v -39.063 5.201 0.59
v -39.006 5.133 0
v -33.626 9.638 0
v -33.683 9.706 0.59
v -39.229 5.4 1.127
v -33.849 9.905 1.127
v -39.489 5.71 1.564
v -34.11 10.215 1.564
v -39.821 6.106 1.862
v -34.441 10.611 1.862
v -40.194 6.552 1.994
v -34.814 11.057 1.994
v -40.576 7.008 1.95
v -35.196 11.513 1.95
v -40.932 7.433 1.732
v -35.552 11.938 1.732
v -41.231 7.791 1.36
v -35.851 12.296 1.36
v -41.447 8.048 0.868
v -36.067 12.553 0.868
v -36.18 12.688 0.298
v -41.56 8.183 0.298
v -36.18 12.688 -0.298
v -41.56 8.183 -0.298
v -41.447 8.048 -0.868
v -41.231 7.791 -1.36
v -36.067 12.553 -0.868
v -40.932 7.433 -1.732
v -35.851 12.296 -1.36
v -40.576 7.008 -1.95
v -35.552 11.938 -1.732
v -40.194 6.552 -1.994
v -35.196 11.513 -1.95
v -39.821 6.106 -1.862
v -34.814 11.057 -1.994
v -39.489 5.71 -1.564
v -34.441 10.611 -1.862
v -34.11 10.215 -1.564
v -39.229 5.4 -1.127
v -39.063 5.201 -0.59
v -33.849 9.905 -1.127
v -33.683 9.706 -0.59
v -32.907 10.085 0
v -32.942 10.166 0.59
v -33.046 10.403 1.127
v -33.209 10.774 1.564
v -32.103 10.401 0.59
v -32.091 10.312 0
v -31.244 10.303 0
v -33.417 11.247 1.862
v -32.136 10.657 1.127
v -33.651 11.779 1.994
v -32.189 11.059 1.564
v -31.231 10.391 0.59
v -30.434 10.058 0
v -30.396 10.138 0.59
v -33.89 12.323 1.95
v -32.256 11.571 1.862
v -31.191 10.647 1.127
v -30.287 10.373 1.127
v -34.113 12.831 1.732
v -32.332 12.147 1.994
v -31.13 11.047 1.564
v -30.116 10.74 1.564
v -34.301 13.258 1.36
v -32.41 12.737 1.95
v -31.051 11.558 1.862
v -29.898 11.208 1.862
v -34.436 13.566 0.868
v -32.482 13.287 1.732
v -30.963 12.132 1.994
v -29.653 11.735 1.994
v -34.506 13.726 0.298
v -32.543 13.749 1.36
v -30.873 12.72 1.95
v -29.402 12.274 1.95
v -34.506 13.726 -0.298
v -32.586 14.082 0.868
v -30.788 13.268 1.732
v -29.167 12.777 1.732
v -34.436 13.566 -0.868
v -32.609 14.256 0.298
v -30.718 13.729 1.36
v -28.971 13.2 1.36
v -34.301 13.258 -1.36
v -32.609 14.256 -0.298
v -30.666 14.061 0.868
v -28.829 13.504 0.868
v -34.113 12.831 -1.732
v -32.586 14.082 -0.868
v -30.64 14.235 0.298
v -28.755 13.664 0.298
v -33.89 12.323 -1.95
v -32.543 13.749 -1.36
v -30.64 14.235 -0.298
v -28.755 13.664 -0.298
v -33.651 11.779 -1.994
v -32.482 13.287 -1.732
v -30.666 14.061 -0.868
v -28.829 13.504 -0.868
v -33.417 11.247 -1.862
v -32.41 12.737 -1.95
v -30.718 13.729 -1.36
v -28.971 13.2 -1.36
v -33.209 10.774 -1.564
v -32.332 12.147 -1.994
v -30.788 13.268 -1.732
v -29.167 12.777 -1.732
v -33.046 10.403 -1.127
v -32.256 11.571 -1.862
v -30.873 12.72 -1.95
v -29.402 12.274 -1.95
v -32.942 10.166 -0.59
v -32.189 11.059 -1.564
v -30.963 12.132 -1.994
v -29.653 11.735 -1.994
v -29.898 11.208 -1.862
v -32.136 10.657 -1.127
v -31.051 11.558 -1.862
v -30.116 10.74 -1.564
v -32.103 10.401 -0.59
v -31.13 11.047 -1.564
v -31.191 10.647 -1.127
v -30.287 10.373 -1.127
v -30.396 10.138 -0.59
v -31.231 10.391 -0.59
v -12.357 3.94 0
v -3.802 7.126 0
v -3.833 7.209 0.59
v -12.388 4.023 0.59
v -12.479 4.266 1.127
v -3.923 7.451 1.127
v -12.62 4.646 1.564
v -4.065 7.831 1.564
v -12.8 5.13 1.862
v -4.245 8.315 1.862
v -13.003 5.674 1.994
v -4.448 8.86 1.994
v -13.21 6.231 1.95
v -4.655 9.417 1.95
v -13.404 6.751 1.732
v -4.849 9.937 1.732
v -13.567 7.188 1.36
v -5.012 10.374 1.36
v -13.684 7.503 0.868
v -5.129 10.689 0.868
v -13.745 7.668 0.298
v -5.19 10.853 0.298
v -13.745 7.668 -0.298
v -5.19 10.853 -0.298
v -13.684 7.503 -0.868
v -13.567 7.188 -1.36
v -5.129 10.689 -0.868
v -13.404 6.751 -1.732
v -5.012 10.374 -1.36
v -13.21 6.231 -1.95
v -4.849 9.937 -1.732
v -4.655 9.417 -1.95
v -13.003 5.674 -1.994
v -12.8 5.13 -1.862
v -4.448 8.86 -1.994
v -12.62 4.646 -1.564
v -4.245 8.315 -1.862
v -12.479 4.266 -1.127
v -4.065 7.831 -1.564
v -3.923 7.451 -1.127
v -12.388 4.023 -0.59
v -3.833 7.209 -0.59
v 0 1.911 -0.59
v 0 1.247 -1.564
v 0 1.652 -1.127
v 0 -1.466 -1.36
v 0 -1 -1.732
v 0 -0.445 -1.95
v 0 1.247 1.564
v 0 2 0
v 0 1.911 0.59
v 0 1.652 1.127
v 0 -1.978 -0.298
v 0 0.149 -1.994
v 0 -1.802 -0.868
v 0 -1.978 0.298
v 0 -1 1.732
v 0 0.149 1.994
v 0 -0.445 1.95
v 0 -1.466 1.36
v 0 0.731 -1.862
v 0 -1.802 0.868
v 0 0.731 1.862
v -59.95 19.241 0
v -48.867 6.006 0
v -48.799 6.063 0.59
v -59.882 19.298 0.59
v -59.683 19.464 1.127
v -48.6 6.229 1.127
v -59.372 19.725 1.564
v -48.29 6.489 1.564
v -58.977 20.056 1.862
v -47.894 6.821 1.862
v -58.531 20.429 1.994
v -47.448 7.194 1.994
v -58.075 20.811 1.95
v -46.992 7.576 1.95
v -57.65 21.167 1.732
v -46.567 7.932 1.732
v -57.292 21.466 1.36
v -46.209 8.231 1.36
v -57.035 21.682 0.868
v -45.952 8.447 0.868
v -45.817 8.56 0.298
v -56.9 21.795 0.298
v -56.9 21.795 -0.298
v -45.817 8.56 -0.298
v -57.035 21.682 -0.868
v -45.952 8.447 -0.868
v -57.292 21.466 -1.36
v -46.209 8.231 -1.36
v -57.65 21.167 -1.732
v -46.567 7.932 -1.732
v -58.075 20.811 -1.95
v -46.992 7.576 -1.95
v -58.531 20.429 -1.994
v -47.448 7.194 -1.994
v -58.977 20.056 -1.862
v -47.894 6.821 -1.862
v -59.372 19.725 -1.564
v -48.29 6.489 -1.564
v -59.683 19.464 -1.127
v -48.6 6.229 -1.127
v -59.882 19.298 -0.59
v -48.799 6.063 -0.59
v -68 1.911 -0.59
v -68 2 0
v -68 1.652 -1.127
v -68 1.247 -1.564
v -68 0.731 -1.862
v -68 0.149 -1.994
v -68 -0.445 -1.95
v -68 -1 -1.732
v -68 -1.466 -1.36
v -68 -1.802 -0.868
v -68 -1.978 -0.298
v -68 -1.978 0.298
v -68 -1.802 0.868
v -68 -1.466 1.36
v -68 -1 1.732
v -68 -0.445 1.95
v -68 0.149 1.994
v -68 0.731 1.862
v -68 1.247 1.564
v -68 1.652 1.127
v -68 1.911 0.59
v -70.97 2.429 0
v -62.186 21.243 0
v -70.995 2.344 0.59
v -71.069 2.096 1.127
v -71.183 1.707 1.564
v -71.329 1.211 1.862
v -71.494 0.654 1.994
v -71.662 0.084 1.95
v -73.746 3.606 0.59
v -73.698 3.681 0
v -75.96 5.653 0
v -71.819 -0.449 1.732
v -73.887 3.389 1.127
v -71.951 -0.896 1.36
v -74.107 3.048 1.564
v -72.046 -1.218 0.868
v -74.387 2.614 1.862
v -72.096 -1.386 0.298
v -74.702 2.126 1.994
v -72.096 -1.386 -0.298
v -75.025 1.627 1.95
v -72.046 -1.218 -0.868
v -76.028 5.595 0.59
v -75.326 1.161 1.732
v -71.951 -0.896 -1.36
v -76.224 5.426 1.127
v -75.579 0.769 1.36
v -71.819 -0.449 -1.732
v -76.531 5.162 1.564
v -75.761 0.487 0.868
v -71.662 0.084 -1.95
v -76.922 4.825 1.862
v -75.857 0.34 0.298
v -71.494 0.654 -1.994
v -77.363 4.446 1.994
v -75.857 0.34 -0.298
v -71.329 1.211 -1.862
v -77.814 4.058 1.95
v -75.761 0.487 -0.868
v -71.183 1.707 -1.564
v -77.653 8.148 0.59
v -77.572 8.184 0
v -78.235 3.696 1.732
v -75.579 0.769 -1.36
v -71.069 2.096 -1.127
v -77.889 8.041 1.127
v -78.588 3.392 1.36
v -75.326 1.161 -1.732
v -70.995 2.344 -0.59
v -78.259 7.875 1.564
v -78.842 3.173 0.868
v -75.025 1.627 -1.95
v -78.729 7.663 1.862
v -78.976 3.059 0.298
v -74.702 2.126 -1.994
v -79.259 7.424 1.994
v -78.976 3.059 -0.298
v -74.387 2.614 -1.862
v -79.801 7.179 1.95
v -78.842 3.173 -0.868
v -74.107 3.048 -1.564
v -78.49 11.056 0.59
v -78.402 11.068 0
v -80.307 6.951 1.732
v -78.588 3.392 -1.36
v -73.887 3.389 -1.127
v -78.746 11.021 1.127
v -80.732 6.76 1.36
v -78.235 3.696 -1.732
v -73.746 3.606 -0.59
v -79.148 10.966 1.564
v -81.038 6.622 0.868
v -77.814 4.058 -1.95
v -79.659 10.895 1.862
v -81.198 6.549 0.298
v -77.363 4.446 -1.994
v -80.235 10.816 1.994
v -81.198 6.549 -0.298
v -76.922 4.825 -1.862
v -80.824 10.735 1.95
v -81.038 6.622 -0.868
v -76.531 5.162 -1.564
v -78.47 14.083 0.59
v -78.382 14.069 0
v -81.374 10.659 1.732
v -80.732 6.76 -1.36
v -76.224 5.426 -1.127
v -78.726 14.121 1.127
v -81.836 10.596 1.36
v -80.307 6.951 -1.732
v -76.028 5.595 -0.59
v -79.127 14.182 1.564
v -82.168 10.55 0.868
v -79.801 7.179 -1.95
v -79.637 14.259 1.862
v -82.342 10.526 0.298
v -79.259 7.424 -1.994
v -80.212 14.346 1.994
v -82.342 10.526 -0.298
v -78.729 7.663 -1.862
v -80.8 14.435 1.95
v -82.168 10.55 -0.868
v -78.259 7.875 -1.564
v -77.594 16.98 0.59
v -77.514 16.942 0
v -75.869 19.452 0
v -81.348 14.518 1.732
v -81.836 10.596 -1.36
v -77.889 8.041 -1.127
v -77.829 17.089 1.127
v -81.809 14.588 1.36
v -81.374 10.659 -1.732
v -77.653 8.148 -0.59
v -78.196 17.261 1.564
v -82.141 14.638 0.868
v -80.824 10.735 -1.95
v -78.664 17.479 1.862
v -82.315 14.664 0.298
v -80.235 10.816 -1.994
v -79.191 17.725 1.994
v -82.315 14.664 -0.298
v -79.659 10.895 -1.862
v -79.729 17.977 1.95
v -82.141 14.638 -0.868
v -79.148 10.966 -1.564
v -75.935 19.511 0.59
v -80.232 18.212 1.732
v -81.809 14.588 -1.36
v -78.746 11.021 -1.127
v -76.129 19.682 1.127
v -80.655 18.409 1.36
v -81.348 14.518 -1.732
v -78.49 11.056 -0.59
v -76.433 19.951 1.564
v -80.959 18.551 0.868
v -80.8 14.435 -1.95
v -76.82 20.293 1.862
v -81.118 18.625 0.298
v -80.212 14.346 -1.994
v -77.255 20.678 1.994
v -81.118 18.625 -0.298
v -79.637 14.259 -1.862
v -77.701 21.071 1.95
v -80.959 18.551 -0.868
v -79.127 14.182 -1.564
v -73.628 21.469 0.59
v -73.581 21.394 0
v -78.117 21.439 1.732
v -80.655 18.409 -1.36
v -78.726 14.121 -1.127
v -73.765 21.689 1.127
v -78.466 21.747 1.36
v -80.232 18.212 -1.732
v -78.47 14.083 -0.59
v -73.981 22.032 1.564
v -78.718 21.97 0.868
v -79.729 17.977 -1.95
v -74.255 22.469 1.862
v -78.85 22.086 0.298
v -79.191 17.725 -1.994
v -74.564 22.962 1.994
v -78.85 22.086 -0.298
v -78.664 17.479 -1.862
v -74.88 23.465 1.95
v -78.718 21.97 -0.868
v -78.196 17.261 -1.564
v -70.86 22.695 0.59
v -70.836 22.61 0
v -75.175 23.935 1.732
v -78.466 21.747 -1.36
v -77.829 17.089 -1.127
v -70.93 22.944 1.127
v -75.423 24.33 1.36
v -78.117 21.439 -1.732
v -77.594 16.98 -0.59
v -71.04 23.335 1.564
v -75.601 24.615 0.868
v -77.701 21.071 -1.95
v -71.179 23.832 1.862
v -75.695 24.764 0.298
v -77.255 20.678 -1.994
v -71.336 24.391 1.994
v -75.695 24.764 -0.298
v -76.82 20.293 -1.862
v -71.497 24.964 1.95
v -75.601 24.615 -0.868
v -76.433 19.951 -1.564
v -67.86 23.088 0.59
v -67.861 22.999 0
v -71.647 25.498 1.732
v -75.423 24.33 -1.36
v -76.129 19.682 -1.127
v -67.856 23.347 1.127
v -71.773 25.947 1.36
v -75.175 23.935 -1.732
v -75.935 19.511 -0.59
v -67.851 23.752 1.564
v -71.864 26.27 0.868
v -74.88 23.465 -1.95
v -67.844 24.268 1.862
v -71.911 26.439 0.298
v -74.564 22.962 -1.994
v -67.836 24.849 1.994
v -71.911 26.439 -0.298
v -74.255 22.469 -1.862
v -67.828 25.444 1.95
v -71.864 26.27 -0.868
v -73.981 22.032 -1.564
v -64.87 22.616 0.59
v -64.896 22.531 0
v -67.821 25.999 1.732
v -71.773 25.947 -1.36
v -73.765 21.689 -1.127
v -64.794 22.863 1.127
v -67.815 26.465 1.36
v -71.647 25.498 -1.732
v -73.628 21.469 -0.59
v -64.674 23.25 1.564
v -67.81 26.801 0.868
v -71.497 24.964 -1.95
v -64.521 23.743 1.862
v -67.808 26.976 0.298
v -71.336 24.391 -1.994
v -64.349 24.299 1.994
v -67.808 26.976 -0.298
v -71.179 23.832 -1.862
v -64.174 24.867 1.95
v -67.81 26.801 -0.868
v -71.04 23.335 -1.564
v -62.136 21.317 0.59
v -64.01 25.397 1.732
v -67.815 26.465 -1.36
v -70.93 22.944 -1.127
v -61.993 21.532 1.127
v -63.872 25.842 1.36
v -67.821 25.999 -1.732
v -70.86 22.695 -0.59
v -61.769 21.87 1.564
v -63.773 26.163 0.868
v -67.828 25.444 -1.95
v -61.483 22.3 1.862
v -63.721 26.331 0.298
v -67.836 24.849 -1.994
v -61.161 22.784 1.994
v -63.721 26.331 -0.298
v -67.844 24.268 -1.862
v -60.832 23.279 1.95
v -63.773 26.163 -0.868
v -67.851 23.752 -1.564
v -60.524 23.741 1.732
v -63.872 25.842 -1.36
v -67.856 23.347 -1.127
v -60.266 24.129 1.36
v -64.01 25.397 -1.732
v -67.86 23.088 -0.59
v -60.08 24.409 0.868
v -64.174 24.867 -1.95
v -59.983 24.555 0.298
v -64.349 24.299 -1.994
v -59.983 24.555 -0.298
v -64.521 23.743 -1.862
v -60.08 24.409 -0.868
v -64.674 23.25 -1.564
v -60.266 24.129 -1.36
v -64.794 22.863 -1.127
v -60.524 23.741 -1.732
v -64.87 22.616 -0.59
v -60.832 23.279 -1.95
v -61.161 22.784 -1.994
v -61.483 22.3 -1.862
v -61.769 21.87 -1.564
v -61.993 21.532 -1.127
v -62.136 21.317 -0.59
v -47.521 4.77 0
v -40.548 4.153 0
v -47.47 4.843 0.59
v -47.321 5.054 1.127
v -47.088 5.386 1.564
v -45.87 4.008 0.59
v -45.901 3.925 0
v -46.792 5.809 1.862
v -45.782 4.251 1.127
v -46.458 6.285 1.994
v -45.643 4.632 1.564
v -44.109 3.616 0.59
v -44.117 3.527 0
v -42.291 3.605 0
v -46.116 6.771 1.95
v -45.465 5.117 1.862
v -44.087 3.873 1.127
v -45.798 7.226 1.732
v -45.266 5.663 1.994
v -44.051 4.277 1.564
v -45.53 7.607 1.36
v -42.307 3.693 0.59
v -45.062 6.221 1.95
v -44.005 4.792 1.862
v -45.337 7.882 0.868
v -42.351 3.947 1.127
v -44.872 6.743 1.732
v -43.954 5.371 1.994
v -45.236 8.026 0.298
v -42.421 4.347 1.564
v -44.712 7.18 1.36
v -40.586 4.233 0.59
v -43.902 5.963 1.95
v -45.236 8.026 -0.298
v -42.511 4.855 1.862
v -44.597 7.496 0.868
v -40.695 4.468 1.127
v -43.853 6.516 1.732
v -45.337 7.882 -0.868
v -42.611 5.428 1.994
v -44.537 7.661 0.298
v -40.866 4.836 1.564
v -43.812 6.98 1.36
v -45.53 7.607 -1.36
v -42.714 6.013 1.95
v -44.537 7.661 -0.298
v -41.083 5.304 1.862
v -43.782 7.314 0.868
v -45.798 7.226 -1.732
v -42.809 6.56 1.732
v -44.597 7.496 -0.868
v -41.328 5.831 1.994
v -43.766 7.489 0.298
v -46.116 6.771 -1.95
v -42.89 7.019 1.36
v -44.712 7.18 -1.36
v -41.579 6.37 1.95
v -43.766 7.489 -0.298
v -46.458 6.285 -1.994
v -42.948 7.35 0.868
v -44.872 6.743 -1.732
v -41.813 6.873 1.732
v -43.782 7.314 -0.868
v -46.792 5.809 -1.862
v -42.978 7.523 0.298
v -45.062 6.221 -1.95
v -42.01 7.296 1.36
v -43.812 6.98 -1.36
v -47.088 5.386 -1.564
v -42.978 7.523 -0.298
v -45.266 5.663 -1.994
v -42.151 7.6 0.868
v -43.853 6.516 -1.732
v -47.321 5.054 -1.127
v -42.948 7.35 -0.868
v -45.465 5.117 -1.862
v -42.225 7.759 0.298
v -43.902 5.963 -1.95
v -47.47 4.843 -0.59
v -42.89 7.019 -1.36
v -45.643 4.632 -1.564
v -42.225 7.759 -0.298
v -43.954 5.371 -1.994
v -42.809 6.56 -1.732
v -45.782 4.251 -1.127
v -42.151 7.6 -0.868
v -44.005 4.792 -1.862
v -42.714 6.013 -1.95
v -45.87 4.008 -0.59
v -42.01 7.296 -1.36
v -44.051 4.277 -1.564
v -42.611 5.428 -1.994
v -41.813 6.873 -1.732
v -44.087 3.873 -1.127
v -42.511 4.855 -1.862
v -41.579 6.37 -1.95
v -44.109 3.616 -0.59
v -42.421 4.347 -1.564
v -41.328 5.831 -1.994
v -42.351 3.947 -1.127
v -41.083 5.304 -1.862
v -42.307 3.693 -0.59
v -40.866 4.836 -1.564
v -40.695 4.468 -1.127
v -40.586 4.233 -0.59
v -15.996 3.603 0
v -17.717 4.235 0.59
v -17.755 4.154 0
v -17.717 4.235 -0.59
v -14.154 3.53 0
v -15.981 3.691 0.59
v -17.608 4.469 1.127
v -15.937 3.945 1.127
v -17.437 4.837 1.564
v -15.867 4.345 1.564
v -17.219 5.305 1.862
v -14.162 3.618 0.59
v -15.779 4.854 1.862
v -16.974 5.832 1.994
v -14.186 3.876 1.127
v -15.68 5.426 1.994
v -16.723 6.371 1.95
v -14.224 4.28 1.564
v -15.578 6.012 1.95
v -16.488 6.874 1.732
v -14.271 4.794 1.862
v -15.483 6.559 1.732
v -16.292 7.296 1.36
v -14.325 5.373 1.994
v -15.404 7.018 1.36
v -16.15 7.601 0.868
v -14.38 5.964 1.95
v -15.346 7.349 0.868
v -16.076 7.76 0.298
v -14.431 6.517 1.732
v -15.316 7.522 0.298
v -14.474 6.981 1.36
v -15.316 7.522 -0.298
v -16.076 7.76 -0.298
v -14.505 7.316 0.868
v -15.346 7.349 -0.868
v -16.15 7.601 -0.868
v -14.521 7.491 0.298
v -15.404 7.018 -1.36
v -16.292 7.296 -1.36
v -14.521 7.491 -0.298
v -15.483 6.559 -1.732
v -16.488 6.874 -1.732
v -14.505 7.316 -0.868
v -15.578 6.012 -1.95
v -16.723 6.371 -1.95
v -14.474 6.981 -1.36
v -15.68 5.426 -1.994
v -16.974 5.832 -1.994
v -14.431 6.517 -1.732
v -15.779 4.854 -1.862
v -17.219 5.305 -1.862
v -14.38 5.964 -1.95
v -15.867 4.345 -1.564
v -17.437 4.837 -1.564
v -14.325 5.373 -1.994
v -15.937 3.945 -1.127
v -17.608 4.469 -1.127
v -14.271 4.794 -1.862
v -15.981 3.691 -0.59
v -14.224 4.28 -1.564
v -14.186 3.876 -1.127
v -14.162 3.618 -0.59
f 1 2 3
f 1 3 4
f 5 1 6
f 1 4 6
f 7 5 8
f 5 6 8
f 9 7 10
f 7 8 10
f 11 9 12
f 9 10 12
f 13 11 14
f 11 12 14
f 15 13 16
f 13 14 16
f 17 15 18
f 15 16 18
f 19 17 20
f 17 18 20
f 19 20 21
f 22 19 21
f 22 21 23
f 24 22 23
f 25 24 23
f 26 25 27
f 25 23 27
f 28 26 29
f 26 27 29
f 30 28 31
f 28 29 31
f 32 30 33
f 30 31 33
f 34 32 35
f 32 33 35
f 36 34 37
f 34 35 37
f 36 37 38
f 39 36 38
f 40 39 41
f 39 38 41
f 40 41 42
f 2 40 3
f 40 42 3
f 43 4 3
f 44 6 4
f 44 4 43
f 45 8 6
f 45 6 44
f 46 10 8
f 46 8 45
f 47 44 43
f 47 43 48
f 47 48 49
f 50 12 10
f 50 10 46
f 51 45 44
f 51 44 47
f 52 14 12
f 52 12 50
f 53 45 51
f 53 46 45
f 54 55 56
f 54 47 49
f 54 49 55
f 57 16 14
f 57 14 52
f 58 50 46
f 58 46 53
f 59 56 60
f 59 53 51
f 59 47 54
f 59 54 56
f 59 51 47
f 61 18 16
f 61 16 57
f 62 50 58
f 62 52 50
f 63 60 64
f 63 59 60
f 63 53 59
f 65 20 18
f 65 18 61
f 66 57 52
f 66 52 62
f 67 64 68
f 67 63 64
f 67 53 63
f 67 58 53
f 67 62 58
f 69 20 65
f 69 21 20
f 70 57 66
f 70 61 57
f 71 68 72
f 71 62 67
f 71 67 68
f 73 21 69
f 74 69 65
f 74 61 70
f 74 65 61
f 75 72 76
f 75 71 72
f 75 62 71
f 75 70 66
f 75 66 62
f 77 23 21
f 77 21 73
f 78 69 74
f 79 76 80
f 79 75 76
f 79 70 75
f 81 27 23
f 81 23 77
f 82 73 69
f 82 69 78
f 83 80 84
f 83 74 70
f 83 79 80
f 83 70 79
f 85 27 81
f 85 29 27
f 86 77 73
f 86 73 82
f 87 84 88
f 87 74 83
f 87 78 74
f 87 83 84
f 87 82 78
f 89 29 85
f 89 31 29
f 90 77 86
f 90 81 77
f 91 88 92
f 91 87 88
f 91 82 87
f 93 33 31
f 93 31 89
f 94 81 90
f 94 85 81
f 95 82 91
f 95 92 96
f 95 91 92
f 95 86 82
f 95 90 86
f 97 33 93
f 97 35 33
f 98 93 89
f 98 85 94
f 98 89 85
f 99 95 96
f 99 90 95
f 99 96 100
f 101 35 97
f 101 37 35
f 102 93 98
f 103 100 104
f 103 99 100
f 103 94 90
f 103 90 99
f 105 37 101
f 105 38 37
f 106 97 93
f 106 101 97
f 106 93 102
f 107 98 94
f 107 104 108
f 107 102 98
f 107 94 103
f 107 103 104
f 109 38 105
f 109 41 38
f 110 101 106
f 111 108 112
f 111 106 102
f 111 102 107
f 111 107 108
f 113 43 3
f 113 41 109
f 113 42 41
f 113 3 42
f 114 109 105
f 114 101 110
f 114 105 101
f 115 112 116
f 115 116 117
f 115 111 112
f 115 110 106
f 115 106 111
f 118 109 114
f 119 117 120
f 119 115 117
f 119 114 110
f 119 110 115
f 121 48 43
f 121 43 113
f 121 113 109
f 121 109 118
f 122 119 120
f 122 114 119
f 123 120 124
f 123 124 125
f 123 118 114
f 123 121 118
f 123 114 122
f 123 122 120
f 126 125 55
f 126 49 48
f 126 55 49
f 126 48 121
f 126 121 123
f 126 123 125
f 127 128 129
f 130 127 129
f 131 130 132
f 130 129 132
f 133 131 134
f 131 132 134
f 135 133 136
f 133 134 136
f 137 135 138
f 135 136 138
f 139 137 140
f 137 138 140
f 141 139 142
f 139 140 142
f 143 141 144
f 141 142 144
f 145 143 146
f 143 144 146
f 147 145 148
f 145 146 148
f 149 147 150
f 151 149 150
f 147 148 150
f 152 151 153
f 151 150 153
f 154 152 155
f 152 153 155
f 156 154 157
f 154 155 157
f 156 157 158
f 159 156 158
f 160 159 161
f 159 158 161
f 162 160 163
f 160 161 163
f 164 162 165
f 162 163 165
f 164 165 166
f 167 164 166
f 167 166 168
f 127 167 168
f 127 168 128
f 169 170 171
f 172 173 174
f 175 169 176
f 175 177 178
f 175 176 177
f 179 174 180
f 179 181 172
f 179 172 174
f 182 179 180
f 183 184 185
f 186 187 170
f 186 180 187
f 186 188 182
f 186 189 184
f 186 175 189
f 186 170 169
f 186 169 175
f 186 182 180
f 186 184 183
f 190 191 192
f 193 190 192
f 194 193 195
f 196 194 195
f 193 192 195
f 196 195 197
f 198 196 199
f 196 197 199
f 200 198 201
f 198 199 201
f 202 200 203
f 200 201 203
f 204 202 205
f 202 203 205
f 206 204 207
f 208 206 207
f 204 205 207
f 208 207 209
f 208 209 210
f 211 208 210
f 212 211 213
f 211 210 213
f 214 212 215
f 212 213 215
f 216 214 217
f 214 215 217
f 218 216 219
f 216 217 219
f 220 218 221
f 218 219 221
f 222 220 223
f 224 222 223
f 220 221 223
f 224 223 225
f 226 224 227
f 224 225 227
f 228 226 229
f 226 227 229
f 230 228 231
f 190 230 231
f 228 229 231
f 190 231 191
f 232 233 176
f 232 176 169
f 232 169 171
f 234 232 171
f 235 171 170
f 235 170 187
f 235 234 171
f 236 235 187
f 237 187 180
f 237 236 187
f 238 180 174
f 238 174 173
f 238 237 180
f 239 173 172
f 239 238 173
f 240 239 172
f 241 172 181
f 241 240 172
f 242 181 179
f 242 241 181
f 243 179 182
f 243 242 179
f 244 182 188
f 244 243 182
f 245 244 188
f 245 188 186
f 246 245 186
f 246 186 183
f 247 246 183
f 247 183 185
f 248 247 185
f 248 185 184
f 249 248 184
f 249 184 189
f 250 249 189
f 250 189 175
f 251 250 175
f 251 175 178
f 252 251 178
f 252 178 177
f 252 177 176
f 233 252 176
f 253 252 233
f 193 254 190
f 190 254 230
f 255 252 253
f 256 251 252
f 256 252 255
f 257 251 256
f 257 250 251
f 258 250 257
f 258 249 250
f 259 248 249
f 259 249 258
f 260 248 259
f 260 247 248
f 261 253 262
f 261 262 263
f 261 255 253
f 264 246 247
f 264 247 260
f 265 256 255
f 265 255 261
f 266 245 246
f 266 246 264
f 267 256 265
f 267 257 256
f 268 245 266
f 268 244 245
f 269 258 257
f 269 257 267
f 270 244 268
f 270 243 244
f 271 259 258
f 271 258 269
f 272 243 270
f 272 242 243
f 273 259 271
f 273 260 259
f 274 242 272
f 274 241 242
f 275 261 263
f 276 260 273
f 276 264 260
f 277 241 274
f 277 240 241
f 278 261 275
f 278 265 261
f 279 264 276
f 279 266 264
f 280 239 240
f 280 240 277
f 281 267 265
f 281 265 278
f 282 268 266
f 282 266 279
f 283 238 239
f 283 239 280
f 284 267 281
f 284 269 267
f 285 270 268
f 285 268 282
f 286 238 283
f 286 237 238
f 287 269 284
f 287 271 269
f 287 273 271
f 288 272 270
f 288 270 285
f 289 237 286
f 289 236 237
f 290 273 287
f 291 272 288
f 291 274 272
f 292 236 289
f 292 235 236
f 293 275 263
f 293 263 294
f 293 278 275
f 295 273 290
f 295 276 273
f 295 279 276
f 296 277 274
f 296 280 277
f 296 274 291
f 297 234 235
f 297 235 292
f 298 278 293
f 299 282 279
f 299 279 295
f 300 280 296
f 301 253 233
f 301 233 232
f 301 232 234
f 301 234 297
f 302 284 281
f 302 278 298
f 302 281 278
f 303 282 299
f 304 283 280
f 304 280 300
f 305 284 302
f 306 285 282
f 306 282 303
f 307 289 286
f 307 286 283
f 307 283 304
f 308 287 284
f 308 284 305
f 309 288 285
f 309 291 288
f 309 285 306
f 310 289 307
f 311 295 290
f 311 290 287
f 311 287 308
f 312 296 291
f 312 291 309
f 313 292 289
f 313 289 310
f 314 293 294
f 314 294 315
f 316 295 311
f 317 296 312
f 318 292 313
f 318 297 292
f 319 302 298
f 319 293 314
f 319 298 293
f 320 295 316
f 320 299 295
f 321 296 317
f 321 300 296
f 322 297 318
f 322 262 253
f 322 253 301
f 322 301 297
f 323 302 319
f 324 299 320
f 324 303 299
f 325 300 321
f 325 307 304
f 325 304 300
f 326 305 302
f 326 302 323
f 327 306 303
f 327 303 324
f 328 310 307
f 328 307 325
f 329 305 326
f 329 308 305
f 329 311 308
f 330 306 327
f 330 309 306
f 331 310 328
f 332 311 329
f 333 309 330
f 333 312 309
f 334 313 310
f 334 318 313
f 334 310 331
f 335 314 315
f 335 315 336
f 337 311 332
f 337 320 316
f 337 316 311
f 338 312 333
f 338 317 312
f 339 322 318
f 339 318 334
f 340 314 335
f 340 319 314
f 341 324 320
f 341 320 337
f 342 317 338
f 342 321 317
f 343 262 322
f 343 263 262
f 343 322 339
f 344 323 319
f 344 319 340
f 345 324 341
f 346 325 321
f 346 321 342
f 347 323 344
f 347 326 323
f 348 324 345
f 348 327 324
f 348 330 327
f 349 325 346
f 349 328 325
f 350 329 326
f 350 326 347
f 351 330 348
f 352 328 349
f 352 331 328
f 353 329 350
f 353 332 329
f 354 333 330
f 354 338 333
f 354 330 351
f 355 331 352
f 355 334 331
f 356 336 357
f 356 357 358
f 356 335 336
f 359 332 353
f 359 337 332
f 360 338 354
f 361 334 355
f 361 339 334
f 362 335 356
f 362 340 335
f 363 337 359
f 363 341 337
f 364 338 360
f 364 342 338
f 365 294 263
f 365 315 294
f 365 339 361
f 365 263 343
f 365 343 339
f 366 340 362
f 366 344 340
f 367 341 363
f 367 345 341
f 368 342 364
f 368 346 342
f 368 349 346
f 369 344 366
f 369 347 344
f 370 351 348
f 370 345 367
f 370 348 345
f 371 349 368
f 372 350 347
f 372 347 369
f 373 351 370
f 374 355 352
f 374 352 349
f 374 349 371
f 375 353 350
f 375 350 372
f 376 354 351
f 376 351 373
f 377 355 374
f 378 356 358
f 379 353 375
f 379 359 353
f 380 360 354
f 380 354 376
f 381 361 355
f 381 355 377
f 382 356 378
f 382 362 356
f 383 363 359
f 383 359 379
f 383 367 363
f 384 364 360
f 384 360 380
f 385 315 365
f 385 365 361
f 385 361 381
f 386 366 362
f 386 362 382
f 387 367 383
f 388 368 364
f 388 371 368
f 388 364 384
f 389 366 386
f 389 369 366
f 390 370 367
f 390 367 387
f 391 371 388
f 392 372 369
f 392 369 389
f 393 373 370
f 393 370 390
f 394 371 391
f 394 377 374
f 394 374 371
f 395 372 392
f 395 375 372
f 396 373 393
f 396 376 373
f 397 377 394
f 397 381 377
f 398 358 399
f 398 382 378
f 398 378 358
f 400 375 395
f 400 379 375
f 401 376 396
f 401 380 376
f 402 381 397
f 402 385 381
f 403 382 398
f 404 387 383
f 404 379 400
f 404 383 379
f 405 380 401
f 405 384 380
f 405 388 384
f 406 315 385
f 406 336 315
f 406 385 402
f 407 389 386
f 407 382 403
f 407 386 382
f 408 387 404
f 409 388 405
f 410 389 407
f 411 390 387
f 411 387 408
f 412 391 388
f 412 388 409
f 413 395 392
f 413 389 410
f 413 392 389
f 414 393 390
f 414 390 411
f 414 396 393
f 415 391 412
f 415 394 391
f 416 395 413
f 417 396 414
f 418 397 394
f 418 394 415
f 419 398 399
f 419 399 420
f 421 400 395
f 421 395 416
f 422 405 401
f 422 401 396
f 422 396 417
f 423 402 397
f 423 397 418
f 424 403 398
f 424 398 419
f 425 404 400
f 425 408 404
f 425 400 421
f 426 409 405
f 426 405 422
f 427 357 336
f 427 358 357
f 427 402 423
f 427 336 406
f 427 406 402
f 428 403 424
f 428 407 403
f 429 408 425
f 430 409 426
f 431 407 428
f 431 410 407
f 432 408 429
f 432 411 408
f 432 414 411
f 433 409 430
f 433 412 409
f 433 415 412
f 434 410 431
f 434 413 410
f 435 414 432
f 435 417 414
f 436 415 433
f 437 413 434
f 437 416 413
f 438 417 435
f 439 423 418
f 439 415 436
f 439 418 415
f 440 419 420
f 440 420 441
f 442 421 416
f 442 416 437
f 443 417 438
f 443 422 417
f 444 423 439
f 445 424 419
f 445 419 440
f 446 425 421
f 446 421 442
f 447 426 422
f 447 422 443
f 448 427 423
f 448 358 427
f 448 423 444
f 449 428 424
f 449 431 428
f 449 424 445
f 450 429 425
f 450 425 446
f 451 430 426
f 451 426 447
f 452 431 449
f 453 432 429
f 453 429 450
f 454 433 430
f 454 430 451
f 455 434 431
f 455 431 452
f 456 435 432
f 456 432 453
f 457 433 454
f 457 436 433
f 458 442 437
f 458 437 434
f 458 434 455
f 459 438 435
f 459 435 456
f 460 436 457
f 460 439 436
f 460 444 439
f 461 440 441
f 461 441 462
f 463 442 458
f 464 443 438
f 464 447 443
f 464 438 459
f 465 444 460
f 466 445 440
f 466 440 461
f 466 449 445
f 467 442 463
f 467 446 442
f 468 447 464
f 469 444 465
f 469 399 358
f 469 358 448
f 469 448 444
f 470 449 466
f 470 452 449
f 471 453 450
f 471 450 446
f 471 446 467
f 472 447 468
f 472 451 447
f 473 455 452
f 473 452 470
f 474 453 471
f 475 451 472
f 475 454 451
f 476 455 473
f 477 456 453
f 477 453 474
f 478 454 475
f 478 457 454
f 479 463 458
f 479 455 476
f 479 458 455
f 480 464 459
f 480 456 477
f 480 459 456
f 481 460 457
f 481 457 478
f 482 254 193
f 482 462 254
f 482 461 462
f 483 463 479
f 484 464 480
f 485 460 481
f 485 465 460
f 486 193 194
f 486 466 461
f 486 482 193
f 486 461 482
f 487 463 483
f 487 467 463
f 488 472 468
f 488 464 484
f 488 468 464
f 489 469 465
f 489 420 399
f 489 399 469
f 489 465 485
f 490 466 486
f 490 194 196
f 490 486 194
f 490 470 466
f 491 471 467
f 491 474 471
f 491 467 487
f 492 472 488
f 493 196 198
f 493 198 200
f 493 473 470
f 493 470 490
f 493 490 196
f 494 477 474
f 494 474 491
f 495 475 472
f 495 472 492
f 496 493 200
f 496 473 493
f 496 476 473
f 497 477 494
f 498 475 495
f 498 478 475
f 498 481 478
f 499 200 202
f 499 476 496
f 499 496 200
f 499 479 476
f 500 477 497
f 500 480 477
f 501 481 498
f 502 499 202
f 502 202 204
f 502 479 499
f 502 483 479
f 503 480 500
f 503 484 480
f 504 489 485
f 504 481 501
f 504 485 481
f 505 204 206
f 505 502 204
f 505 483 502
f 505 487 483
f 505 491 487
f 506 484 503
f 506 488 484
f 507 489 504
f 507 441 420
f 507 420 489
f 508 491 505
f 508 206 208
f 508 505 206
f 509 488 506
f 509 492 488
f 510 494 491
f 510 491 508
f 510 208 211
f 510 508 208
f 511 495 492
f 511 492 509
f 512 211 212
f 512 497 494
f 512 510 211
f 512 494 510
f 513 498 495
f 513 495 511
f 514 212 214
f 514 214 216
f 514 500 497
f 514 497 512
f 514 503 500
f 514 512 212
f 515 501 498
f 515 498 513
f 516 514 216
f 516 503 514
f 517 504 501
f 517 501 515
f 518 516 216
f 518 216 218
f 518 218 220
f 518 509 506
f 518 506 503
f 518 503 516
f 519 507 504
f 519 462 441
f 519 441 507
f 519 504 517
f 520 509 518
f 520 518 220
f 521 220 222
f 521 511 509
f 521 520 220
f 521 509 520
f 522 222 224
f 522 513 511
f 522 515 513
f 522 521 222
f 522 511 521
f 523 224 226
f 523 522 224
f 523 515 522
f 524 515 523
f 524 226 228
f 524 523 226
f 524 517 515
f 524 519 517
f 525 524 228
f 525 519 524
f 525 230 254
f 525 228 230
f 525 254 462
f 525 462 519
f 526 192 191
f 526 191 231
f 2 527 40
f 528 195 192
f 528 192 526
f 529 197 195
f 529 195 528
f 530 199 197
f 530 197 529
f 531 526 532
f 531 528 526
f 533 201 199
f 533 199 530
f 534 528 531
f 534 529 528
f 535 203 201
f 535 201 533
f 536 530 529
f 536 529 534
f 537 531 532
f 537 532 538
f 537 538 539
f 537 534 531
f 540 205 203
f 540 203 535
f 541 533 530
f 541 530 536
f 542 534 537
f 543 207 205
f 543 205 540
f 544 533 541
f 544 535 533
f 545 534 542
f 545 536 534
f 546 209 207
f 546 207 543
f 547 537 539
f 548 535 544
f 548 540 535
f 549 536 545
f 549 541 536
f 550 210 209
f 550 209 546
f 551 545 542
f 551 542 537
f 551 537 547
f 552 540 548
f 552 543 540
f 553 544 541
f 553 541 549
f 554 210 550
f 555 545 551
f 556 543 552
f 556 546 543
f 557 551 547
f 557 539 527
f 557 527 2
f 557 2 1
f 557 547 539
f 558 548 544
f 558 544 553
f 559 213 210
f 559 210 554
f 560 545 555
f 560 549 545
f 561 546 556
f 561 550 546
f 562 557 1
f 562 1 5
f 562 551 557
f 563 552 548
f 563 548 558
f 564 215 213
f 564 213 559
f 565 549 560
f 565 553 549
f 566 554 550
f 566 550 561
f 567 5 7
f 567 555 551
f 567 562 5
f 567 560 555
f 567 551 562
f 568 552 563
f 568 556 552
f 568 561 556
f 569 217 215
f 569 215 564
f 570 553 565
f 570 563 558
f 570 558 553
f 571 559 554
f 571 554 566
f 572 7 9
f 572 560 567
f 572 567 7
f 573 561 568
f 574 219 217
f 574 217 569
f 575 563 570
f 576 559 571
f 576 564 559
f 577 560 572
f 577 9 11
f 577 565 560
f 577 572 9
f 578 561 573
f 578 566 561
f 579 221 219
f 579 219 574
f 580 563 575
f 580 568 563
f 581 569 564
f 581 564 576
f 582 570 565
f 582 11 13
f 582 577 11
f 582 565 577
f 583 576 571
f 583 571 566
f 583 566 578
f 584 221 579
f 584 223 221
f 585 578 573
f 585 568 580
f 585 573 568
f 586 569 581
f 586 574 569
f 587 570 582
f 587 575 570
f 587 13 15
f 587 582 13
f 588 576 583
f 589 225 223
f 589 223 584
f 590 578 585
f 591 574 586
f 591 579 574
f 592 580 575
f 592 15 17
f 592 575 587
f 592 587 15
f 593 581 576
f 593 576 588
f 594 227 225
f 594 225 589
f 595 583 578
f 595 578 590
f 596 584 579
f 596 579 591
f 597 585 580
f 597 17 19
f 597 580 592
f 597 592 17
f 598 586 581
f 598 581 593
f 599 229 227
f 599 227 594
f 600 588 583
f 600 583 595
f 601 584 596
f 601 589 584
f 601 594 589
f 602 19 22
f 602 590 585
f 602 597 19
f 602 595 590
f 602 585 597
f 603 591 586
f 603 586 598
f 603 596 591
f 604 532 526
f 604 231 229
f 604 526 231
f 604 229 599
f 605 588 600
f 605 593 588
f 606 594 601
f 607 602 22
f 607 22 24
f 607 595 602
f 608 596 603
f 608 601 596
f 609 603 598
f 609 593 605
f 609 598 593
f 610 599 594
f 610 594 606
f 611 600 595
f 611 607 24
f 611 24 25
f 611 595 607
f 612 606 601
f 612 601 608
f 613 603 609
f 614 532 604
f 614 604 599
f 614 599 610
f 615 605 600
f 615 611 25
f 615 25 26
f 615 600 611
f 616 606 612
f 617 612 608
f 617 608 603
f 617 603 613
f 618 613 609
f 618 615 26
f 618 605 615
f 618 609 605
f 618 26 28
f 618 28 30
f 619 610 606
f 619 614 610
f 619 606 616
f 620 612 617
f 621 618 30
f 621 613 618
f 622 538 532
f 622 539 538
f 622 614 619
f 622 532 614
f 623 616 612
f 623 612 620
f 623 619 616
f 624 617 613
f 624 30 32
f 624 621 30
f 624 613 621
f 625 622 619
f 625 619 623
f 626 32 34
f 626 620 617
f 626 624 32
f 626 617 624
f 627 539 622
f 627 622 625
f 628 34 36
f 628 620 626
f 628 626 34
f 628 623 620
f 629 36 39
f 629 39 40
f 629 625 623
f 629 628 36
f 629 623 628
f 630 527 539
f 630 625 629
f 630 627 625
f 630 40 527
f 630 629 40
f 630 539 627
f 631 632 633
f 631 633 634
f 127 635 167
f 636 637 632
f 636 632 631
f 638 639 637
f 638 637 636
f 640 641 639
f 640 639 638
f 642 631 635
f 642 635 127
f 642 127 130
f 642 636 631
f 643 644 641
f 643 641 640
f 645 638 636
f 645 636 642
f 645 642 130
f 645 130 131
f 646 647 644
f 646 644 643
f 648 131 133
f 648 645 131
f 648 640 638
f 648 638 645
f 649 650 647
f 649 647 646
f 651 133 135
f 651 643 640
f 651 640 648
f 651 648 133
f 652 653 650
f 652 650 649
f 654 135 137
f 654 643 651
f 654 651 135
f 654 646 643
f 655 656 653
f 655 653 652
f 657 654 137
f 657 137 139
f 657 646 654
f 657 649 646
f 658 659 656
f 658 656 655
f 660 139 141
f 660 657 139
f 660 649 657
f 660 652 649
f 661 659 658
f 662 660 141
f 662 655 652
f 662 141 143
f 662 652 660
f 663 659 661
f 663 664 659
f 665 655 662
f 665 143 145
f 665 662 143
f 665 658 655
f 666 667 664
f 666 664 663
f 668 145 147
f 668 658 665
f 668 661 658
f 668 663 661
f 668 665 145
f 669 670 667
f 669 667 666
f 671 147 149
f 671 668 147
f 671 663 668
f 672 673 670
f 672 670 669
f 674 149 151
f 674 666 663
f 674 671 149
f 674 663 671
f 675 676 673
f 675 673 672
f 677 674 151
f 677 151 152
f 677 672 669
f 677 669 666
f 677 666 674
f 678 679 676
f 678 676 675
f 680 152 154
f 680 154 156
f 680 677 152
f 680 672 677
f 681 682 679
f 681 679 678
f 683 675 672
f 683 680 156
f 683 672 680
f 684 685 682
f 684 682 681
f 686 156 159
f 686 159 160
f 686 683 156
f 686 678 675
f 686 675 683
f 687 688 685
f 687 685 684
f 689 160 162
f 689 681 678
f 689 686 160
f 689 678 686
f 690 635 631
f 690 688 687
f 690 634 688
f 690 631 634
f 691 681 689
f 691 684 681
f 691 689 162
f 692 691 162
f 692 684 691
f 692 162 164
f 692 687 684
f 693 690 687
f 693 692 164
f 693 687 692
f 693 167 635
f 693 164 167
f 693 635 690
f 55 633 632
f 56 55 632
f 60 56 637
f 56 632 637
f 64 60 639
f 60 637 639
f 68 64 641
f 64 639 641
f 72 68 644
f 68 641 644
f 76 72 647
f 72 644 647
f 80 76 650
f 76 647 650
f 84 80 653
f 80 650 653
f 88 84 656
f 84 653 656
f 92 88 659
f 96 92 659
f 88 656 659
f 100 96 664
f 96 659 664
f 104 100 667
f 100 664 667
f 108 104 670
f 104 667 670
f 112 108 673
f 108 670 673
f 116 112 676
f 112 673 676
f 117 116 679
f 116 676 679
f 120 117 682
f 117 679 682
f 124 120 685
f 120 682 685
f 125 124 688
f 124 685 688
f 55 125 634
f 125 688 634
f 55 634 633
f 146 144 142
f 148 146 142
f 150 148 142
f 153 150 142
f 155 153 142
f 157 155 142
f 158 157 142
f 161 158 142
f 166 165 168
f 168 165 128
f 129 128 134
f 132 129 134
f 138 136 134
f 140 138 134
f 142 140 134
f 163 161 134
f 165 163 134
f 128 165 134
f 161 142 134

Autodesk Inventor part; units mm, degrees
ref_plane "YZ Plane" through (0, 0, 0) normal (1, 0, 0) x (0, 1, 0)
ref_plane "XZ Plane" through (0, 0, 0) normal (0, 1, 0) x (-1, 0, 0)
ref_plane "XY Plane" through (0, 0, 0) normal (0, 0, 1) x (1, 0, 0)
sketch "Sketch1" plane through (0, 0, 0) normal (0, 0, 1) x (1, 0, 0)
  line L0 (0, 0) -> (-68, 0)
  arc A0 (-58.4163, 20.5251) -> (-68, 0) centre (-68, 12.5) ccw
  line L1 (-58.4163, 20.5251) -> (-47.3335, 7.2899)
  arc A1 (-47.3335, 7.2899) -> (-40.2899, 6.6665) centre (-43.5, 10.5) ccw
  line L2 (-40.2899, 6.6665) -> (-34.9101, 11.1715)
  arc A2 (-29.5895, 11.8708) -> (-34.9101, 11.1715) centre (-31.7, 7.338) ccw
  line L3 (-29.5895, 11.8708) -> (-16.9105, 5.9673)
  arc A3 (-16.9105, 5.9673) -> (-13.0552, 5.8143) centre (-14.8, 10.5) ccw
  line L4 (-13.0552, 5.8143) -> (-4.5, 9)
  dimension "d0" = 68
  dimension "d1" = 12.5
  dimension "d2" = 24.5
  dimension "d3" = 36.3
  dimension "d4" = 53.2
  dimension "d5" = 5
  dimension "d6" = 10.5
  dimension "d8" = 9
  dimension "d9" = 63.5
sketch "Sketch2" plane through (0, 0, 0) normal (1, 0, 0) x (0, 1, 0)
  circle A0 centre (0, 0) radius 2
  dimension "d7" = 4
sweep "Sweep1" add profiles "Sketch2" path "Sketch1"
properties part number "B1"
